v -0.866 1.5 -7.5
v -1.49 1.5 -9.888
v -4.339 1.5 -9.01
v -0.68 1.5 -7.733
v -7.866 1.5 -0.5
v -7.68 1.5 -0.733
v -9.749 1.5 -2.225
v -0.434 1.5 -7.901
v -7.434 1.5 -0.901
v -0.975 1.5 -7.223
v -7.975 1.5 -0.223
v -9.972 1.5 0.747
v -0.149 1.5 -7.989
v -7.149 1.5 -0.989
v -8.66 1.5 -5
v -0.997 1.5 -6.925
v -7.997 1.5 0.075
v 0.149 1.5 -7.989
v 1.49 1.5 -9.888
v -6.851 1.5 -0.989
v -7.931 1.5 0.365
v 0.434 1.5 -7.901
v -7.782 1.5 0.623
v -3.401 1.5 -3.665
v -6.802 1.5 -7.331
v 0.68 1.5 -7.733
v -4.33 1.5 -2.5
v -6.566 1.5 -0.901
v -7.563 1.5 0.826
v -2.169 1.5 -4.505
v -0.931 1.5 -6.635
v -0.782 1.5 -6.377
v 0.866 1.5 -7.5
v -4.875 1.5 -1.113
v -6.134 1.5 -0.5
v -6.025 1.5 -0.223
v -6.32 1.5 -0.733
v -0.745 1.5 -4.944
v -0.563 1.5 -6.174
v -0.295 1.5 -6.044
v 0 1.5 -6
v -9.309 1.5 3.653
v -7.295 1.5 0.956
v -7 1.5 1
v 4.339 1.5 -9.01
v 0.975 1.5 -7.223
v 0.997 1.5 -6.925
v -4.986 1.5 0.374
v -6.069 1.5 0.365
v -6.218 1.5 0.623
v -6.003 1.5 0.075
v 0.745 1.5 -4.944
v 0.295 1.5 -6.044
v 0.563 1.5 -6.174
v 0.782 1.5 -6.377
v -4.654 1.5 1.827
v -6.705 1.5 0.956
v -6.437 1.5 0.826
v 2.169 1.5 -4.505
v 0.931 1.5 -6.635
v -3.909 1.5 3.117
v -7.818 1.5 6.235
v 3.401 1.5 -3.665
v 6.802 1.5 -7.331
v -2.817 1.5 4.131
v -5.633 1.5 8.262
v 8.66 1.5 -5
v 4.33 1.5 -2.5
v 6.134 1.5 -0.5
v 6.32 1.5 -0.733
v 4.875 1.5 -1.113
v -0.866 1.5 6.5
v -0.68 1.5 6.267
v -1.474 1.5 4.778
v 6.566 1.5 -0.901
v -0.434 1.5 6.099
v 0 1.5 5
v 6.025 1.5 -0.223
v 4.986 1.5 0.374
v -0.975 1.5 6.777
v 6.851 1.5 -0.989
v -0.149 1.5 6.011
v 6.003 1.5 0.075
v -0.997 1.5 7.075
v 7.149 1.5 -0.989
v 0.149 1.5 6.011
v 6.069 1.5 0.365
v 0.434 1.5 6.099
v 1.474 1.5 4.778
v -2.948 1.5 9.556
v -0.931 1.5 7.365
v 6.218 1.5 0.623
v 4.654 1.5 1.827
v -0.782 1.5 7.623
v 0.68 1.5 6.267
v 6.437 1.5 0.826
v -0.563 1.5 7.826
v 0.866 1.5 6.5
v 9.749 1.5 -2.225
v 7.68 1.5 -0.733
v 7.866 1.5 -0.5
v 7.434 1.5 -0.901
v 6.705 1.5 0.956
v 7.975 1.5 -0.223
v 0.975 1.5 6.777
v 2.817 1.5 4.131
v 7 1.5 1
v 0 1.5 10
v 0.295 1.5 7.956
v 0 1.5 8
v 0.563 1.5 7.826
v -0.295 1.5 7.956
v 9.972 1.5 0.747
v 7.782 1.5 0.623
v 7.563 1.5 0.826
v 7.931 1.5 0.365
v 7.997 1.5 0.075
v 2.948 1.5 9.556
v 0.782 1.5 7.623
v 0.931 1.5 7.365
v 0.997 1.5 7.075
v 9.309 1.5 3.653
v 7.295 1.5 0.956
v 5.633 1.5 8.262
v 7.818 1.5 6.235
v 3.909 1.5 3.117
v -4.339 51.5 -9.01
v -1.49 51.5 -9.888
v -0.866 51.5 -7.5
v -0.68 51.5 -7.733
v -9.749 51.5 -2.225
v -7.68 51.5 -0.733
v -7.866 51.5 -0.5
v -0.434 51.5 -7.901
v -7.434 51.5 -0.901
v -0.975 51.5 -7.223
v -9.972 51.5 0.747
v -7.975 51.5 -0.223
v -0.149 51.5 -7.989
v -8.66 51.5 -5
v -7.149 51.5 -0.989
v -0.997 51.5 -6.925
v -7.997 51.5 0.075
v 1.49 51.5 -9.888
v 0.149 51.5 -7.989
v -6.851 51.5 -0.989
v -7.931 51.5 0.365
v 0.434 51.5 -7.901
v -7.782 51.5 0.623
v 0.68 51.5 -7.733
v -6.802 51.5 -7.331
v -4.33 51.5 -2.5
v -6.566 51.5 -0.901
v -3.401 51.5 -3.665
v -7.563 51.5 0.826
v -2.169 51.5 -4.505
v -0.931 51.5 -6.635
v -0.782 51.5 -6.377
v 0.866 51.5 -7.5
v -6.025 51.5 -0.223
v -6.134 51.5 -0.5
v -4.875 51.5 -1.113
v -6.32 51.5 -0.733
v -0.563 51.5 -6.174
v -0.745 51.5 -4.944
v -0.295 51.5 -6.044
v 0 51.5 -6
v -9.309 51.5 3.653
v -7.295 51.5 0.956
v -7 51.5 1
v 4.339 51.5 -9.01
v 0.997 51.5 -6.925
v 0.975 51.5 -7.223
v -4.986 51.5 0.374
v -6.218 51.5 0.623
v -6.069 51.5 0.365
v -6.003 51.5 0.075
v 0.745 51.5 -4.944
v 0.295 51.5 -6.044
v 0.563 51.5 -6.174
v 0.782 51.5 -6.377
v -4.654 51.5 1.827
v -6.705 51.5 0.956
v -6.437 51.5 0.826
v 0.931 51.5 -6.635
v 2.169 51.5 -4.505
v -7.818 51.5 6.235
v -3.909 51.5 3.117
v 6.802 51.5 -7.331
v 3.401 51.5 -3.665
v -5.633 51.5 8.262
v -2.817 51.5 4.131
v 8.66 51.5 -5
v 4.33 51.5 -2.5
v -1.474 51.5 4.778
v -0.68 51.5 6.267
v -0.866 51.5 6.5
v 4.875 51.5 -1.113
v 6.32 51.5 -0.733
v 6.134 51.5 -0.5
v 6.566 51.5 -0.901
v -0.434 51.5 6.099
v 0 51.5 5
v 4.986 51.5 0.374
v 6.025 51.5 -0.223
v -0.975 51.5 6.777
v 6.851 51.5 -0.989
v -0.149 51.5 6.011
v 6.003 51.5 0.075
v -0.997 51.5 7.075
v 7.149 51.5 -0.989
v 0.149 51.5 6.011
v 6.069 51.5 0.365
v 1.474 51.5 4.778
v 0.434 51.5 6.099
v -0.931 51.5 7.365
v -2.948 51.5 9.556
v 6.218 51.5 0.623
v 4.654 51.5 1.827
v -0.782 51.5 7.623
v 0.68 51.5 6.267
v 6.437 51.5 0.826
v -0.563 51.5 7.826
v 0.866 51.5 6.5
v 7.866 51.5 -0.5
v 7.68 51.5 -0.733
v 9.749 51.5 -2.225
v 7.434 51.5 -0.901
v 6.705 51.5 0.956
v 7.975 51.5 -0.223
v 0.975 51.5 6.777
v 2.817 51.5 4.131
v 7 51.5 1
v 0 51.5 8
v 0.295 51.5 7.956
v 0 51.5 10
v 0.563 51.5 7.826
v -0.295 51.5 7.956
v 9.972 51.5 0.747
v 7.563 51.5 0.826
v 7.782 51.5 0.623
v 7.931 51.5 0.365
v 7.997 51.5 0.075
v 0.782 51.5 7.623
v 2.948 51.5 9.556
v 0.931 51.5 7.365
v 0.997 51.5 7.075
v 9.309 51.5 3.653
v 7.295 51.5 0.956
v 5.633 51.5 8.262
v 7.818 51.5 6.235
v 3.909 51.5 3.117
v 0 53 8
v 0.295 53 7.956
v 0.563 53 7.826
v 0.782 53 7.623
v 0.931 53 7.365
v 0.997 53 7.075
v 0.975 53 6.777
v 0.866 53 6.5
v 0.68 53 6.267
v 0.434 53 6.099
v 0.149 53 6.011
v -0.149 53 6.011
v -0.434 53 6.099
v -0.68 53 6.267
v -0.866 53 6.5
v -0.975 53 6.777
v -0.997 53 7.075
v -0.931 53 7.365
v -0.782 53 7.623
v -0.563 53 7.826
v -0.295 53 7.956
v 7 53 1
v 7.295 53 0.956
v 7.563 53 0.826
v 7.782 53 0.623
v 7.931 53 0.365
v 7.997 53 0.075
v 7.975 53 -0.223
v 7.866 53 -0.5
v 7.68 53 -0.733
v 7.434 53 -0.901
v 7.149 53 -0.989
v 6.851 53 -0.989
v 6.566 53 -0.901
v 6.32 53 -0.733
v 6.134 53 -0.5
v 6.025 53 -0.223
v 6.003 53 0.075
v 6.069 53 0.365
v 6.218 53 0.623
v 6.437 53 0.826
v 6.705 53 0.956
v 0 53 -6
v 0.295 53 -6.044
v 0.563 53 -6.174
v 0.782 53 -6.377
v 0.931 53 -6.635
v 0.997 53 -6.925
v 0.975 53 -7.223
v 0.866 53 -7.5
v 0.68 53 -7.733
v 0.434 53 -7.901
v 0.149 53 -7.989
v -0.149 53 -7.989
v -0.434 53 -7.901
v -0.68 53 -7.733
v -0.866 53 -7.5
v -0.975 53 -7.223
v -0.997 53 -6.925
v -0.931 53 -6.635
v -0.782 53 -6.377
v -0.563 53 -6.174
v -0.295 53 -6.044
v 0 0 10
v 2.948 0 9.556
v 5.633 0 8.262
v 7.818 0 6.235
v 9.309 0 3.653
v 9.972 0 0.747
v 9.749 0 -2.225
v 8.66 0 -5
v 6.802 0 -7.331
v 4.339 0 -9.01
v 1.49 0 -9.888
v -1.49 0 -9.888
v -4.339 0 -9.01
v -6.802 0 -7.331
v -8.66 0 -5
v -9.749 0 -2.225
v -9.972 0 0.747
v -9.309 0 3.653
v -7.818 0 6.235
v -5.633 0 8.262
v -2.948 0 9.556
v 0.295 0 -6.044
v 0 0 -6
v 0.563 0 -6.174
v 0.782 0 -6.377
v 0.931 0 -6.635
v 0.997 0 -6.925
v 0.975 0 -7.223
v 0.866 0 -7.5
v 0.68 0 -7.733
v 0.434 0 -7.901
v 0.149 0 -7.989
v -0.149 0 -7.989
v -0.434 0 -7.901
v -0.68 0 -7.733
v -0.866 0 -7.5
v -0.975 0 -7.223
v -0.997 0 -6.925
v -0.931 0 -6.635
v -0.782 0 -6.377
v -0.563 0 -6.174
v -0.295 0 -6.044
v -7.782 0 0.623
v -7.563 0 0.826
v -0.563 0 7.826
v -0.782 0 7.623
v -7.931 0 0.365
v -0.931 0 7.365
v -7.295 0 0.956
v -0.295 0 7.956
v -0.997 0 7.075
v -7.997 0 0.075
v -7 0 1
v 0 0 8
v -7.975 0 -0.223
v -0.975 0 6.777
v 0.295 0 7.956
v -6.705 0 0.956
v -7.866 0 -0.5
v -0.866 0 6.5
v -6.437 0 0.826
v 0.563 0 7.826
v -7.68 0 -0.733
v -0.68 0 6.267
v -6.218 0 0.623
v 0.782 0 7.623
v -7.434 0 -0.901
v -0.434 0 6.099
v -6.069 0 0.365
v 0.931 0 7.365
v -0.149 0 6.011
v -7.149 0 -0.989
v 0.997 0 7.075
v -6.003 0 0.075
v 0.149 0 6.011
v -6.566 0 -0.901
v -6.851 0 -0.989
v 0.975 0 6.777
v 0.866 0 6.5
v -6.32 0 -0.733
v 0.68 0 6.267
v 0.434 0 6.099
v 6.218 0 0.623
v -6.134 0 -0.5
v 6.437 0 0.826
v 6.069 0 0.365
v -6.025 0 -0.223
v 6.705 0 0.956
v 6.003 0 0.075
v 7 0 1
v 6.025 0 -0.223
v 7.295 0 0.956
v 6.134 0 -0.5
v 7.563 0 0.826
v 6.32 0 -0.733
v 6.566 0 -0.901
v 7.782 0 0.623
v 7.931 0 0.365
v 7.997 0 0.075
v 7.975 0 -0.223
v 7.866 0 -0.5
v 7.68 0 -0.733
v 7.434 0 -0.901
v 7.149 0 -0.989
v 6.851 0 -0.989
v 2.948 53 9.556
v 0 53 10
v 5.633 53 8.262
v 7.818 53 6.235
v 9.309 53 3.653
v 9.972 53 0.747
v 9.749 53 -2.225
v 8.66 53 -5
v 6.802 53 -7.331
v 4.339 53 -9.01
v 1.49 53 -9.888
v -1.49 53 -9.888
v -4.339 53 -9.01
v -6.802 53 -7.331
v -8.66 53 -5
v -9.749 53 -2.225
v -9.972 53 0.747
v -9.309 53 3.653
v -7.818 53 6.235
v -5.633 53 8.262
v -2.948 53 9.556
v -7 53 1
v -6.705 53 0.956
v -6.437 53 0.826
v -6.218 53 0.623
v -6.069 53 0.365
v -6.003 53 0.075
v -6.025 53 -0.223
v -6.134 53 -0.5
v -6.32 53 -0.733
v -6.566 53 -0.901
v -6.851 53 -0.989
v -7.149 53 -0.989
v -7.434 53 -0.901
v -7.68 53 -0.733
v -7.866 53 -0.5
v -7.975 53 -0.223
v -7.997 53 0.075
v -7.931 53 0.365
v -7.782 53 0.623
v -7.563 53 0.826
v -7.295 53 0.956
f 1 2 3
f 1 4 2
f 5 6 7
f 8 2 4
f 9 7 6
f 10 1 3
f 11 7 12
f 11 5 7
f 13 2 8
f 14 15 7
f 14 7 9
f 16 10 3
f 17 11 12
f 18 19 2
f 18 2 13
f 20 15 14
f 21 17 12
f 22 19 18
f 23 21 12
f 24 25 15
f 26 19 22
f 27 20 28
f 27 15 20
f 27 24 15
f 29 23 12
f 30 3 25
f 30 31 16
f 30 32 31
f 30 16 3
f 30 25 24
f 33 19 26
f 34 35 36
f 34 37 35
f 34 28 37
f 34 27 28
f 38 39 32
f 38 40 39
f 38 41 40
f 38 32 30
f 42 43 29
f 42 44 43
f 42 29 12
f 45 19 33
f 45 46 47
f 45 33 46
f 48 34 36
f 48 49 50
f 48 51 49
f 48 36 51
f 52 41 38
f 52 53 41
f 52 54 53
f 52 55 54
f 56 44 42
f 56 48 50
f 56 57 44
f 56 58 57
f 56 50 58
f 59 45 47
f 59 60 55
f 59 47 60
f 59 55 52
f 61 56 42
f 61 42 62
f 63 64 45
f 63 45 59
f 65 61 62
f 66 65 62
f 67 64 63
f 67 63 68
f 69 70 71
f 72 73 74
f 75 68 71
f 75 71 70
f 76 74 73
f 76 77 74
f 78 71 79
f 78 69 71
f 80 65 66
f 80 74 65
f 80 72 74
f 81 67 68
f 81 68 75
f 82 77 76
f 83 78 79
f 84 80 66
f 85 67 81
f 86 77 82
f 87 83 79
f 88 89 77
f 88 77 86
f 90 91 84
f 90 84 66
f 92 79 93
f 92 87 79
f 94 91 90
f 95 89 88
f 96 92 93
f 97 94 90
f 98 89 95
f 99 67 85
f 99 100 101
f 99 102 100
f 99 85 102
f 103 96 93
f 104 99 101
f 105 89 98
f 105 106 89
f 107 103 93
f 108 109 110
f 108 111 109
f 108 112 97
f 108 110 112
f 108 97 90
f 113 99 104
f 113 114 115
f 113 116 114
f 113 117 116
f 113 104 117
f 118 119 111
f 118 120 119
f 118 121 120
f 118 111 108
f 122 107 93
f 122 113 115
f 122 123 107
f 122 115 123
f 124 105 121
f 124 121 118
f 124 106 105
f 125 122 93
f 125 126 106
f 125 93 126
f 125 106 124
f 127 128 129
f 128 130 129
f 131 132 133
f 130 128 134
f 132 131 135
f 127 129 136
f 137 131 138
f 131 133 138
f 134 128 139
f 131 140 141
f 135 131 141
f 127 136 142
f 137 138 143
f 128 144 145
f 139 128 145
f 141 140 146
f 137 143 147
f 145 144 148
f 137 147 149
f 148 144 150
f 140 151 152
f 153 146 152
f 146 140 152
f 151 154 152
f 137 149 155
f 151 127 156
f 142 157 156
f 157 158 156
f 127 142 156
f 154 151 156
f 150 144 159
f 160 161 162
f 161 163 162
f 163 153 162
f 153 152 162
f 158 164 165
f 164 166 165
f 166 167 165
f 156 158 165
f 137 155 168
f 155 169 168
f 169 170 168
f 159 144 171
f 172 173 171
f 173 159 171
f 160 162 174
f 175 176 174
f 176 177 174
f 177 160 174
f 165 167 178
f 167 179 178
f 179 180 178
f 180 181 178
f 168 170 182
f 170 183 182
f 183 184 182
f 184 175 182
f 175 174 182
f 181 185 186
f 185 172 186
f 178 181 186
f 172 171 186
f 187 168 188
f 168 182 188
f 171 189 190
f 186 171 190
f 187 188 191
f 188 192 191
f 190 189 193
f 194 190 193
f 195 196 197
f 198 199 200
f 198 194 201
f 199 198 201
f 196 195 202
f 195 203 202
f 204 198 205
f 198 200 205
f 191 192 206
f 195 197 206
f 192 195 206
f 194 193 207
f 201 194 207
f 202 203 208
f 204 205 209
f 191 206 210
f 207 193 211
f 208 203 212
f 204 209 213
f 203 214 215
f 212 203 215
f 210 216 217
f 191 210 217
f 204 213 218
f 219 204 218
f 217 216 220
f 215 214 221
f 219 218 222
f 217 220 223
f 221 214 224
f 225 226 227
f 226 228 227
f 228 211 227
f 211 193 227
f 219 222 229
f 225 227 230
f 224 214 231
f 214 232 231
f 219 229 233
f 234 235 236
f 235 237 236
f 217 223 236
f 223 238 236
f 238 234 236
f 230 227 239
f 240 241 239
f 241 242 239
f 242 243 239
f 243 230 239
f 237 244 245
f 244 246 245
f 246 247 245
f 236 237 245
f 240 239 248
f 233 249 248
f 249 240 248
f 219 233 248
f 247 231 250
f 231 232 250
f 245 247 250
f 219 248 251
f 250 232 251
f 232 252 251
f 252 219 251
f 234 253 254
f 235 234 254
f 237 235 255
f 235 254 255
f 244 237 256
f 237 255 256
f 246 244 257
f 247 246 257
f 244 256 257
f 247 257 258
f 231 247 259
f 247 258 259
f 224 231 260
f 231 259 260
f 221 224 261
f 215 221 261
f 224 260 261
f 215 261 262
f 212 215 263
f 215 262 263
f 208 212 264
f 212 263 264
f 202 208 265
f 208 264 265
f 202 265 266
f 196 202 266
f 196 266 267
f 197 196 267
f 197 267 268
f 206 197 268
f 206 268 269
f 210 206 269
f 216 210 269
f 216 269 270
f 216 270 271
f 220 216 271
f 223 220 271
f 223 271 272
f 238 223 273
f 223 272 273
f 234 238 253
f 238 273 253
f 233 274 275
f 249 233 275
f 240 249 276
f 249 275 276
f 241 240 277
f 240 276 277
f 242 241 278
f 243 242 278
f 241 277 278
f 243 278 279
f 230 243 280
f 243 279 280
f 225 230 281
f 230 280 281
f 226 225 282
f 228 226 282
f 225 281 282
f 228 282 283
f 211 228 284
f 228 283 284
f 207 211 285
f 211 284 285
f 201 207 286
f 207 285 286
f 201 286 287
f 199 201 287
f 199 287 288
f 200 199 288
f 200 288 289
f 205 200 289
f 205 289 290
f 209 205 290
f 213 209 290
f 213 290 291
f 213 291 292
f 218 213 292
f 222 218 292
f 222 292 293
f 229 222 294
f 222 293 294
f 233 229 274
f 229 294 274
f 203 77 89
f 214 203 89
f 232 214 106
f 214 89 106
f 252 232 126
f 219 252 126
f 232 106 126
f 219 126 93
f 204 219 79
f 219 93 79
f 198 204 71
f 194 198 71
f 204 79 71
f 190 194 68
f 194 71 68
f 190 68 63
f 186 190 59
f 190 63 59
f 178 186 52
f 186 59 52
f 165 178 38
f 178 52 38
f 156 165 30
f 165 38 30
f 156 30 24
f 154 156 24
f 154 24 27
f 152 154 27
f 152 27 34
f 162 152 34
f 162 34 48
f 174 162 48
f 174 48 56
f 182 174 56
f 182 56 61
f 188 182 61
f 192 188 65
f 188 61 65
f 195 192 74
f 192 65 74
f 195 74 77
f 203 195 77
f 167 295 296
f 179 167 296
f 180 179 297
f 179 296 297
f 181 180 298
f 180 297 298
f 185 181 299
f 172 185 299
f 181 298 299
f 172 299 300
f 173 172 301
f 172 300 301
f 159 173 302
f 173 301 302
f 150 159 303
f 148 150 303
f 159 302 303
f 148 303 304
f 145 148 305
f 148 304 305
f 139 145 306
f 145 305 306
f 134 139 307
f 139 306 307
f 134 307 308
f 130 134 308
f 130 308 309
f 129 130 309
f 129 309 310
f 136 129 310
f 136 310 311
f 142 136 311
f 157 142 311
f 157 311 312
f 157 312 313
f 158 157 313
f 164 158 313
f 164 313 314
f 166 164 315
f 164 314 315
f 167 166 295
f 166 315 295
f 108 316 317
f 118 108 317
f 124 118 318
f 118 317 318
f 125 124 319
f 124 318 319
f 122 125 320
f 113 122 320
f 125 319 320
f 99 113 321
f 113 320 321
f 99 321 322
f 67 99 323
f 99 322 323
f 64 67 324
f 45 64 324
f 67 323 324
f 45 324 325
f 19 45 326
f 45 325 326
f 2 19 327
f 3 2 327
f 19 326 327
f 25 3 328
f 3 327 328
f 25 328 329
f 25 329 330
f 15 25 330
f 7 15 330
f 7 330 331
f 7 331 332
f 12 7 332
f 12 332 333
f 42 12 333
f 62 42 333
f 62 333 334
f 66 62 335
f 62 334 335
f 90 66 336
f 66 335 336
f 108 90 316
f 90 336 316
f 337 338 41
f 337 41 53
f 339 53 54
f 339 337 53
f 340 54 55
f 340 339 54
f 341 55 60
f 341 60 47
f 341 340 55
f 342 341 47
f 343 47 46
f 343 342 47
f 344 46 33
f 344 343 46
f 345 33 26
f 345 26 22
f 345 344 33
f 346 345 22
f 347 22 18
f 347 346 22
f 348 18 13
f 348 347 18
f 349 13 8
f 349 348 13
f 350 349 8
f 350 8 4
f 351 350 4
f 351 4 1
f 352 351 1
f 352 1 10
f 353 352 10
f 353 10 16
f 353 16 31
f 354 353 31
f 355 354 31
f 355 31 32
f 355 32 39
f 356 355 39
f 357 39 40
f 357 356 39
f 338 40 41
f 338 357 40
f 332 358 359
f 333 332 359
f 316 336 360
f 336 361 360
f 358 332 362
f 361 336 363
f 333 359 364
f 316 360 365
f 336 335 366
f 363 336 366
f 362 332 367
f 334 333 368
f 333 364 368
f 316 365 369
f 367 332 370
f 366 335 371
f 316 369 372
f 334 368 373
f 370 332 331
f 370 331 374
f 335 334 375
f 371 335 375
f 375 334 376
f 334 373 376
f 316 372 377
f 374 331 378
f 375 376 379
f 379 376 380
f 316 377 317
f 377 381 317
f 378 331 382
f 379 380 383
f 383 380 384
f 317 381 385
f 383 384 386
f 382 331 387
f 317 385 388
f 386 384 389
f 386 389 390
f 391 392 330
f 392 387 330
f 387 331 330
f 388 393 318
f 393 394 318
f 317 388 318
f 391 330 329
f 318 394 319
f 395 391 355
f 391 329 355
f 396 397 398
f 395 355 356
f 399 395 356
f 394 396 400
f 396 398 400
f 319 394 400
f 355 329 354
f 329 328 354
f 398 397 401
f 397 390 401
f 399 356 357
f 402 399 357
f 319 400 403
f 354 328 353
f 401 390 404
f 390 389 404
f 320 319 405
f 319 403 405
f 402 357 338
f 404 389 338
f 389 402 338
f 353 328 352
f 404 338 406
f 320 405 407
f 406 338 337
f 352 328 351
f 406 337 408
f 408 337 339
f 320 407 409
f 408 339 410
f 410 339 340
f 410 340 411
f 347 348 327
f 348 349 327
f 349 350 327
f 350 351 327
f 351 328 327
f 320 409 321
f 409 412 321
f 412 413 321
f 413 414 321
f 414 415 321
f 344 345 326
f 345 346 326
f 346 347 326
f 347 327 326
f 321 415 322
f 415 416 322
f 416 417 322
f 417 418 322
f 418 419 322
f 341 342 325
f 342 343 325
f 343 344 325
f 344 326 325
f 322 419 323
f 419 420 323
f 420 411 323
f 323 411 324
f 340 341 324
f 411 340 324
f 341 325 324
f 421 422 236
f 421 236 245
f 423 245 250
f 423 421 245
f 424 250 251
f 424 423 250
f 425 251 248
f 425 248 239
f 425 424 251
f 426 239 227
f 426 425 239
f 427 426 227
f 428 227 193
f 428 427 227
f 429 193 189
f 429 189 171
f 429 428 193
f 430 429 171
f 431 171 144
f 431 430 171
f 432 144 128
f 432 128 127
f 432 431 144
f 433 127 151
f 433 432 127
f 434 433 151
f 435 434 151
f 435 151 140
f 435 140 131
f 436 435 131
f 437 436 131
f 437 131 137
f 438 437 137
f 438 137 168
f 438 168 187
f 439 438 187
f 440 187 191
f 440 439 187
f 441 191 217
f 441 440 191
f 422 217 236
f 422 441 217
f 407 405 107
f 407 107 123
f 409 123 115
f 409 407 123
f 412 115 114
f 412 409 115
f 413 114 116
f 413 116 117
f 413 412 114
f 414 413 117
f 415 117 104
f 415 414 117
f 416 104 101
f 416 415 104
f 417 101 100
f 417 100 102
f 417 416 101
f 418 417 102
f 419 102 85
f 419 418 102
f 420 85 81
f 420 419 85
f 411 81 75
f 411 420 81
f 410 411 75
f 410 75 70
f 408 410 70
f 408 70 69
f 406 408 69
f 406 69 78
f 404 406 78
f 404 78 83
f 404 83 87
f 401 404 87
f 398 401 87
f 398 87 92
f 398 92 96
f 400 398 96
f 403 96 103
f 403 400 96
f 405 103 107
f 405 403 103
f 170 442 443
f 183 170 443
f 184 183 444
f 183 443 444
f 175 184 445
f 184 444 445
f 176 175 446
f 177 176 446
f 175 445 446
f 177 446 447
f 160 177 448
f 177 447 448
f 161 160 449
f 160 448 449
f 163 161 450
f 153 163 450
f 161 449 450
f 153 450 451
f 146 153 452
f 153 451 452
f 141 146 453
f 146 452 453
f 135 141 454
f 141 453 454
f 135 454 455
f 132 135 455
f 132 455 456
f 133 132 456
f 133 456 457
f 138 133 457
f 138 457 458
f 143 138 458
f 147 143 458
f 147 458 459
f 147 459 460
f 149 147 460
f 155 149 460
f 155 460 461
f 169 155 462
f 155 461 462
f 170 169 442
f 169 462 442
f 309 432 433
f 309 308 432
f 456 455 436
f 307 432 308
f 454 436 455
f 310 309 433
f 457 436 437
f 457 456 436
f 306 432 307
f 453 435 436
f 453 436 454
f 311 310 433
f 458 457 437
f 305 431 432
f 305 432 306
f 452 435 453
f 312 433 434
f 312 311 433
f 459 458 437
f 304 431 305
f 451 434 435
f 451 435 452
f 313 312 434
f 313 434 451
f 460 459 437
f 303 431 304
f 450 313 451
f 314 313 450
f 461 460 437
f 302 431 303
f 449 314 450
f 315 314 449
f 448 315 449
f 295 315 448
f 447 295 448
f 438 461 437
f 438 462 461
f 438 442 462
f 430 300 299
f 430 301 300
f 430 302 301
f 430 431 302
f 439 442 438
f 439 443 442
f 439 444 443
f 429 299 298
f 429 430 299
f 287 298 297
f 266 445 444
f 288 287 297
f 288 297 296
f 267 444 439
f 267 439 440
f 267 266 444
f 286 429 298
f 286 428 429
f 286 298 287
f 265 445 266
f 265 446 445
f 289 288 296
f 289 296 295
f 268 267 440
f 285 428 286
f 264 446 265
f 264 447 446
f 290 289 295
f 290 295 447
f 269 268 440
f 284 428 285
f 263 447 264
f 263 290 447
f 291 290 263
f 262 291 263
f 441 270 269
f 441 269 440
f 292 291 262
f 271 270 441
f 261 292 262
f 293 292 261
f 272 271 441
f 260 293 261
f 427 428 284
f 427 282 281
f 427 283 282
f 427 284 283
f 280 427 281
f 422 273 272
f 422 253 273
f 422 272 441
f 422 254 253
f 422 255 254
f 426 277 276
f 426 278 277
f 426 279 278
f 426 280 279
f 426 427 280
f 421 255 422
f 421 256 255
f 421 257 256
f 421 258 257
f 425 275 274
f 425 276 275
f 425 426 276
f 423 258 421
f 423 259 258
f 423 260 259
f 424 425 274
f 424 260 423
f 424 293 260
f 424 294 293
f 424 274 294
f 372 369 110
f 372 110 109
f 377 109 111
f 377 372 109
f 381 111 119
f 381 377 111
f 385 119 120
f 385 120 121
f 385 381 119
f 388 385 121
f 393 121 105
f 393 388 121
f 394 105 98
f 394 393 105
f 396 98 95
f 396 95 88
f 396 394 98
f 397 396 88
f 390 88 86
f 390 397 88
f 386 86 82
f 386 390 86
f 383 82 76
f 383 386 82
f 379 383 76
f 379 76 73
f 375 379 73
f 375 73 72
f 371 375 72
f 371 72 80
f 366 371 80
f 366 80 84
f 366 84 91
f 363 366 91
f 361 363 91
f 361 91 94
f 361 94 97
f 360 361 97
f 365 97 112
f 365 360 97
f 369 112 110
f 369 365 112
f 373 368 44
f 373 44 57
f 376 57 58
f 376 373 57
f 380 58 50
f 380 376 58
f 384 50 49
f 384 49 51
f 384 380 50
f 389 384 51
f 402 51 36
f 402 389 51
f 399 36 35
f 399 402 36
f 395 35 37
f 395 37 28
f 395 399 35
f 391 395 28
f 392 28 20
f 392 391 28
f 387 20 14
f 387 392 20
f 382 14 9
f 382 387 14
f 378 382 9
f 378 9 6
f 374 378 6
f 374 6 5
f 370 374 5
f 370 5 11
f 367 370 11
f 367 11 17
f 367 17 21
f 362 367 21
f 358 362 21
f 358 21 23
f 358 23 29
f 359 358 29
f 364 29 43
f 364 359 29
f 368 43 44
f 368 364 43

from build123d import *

# Parameters (mm, degrees)
SKETCH1_R           = 10
SKETCH1_R_2         = 2
SKETCH1_R_3         = 1
BOSS_EXTRUDE1_DEPTH = 1.5
SKETCH2_R           = 5
BOSS_EXTRUDE2_DEPTH = 50


with BuildPart() as part:
    # Sketch1 → Boss-Extrude1 (new body)
    # profile 1 of 2: a face of its own
    with BuildSketch(Plane(origin=(0, 0, 0), x_dir=(1, 0, 0), z_dir=(0, 1, 0))):
        with Locations(Location((0, 0, 0), (0, 0, 270))):
            Circle(SKETCH1_R)
        Circle(SKETCH1_R_2, mode=Mode.SUBTRACT)
        with Locations(Location((0, -7, 0), (0, 0, 270))):
            Circle(SKETCH1_R_3, mode=Mode.SUBTRACT)
        with Locations(Location((7, 0, 0), (0, 0, 270))):
            Circle(SKETCH1_R_3, mode=Mode.SUBTRACT)
        with Locations(Location((0, 7, 0), (0, 0, 270))):
            Circle(SKETCH1_R_3, mode=Mode.SUBTRACT)
        with Locations(Location((-7, 0, 0), (0, 0, 270))):
            Circle(SKETCH1_R_3, mode=Mode.SUBTRACT)
    # profile 2 of 2: a face of its own
    with BuildSketch(Plane(origin=(0, 0, 0), x_dir=(1, 0, 0), z_dir=(0, 1, 0))):
        Circle(SKETCH1_R_2)
    boss_extrude1 = extrude(amount=BOSS_EXTRUDE1_DEPTH)

    # Sketch2 → Boss-Extrude2 (add)
    with BuildSketch(Plane(origin=(0, 1.5, 0), x_dir=(1, 0, 0), z_dir=(0, 1, 0))):
        with Locations(Location((0, 0, 0), (0, 0, 270))):
            Circle(SKETCH2_R)
    extrude(amount=BOSS_EXTRUDE2_DEPTH)

    # Mirror1: Boss-Extrude1 across plane
    add(boss_extrude1.mirror(Plane.ZX.offset(26.5)))


solid = part.part
